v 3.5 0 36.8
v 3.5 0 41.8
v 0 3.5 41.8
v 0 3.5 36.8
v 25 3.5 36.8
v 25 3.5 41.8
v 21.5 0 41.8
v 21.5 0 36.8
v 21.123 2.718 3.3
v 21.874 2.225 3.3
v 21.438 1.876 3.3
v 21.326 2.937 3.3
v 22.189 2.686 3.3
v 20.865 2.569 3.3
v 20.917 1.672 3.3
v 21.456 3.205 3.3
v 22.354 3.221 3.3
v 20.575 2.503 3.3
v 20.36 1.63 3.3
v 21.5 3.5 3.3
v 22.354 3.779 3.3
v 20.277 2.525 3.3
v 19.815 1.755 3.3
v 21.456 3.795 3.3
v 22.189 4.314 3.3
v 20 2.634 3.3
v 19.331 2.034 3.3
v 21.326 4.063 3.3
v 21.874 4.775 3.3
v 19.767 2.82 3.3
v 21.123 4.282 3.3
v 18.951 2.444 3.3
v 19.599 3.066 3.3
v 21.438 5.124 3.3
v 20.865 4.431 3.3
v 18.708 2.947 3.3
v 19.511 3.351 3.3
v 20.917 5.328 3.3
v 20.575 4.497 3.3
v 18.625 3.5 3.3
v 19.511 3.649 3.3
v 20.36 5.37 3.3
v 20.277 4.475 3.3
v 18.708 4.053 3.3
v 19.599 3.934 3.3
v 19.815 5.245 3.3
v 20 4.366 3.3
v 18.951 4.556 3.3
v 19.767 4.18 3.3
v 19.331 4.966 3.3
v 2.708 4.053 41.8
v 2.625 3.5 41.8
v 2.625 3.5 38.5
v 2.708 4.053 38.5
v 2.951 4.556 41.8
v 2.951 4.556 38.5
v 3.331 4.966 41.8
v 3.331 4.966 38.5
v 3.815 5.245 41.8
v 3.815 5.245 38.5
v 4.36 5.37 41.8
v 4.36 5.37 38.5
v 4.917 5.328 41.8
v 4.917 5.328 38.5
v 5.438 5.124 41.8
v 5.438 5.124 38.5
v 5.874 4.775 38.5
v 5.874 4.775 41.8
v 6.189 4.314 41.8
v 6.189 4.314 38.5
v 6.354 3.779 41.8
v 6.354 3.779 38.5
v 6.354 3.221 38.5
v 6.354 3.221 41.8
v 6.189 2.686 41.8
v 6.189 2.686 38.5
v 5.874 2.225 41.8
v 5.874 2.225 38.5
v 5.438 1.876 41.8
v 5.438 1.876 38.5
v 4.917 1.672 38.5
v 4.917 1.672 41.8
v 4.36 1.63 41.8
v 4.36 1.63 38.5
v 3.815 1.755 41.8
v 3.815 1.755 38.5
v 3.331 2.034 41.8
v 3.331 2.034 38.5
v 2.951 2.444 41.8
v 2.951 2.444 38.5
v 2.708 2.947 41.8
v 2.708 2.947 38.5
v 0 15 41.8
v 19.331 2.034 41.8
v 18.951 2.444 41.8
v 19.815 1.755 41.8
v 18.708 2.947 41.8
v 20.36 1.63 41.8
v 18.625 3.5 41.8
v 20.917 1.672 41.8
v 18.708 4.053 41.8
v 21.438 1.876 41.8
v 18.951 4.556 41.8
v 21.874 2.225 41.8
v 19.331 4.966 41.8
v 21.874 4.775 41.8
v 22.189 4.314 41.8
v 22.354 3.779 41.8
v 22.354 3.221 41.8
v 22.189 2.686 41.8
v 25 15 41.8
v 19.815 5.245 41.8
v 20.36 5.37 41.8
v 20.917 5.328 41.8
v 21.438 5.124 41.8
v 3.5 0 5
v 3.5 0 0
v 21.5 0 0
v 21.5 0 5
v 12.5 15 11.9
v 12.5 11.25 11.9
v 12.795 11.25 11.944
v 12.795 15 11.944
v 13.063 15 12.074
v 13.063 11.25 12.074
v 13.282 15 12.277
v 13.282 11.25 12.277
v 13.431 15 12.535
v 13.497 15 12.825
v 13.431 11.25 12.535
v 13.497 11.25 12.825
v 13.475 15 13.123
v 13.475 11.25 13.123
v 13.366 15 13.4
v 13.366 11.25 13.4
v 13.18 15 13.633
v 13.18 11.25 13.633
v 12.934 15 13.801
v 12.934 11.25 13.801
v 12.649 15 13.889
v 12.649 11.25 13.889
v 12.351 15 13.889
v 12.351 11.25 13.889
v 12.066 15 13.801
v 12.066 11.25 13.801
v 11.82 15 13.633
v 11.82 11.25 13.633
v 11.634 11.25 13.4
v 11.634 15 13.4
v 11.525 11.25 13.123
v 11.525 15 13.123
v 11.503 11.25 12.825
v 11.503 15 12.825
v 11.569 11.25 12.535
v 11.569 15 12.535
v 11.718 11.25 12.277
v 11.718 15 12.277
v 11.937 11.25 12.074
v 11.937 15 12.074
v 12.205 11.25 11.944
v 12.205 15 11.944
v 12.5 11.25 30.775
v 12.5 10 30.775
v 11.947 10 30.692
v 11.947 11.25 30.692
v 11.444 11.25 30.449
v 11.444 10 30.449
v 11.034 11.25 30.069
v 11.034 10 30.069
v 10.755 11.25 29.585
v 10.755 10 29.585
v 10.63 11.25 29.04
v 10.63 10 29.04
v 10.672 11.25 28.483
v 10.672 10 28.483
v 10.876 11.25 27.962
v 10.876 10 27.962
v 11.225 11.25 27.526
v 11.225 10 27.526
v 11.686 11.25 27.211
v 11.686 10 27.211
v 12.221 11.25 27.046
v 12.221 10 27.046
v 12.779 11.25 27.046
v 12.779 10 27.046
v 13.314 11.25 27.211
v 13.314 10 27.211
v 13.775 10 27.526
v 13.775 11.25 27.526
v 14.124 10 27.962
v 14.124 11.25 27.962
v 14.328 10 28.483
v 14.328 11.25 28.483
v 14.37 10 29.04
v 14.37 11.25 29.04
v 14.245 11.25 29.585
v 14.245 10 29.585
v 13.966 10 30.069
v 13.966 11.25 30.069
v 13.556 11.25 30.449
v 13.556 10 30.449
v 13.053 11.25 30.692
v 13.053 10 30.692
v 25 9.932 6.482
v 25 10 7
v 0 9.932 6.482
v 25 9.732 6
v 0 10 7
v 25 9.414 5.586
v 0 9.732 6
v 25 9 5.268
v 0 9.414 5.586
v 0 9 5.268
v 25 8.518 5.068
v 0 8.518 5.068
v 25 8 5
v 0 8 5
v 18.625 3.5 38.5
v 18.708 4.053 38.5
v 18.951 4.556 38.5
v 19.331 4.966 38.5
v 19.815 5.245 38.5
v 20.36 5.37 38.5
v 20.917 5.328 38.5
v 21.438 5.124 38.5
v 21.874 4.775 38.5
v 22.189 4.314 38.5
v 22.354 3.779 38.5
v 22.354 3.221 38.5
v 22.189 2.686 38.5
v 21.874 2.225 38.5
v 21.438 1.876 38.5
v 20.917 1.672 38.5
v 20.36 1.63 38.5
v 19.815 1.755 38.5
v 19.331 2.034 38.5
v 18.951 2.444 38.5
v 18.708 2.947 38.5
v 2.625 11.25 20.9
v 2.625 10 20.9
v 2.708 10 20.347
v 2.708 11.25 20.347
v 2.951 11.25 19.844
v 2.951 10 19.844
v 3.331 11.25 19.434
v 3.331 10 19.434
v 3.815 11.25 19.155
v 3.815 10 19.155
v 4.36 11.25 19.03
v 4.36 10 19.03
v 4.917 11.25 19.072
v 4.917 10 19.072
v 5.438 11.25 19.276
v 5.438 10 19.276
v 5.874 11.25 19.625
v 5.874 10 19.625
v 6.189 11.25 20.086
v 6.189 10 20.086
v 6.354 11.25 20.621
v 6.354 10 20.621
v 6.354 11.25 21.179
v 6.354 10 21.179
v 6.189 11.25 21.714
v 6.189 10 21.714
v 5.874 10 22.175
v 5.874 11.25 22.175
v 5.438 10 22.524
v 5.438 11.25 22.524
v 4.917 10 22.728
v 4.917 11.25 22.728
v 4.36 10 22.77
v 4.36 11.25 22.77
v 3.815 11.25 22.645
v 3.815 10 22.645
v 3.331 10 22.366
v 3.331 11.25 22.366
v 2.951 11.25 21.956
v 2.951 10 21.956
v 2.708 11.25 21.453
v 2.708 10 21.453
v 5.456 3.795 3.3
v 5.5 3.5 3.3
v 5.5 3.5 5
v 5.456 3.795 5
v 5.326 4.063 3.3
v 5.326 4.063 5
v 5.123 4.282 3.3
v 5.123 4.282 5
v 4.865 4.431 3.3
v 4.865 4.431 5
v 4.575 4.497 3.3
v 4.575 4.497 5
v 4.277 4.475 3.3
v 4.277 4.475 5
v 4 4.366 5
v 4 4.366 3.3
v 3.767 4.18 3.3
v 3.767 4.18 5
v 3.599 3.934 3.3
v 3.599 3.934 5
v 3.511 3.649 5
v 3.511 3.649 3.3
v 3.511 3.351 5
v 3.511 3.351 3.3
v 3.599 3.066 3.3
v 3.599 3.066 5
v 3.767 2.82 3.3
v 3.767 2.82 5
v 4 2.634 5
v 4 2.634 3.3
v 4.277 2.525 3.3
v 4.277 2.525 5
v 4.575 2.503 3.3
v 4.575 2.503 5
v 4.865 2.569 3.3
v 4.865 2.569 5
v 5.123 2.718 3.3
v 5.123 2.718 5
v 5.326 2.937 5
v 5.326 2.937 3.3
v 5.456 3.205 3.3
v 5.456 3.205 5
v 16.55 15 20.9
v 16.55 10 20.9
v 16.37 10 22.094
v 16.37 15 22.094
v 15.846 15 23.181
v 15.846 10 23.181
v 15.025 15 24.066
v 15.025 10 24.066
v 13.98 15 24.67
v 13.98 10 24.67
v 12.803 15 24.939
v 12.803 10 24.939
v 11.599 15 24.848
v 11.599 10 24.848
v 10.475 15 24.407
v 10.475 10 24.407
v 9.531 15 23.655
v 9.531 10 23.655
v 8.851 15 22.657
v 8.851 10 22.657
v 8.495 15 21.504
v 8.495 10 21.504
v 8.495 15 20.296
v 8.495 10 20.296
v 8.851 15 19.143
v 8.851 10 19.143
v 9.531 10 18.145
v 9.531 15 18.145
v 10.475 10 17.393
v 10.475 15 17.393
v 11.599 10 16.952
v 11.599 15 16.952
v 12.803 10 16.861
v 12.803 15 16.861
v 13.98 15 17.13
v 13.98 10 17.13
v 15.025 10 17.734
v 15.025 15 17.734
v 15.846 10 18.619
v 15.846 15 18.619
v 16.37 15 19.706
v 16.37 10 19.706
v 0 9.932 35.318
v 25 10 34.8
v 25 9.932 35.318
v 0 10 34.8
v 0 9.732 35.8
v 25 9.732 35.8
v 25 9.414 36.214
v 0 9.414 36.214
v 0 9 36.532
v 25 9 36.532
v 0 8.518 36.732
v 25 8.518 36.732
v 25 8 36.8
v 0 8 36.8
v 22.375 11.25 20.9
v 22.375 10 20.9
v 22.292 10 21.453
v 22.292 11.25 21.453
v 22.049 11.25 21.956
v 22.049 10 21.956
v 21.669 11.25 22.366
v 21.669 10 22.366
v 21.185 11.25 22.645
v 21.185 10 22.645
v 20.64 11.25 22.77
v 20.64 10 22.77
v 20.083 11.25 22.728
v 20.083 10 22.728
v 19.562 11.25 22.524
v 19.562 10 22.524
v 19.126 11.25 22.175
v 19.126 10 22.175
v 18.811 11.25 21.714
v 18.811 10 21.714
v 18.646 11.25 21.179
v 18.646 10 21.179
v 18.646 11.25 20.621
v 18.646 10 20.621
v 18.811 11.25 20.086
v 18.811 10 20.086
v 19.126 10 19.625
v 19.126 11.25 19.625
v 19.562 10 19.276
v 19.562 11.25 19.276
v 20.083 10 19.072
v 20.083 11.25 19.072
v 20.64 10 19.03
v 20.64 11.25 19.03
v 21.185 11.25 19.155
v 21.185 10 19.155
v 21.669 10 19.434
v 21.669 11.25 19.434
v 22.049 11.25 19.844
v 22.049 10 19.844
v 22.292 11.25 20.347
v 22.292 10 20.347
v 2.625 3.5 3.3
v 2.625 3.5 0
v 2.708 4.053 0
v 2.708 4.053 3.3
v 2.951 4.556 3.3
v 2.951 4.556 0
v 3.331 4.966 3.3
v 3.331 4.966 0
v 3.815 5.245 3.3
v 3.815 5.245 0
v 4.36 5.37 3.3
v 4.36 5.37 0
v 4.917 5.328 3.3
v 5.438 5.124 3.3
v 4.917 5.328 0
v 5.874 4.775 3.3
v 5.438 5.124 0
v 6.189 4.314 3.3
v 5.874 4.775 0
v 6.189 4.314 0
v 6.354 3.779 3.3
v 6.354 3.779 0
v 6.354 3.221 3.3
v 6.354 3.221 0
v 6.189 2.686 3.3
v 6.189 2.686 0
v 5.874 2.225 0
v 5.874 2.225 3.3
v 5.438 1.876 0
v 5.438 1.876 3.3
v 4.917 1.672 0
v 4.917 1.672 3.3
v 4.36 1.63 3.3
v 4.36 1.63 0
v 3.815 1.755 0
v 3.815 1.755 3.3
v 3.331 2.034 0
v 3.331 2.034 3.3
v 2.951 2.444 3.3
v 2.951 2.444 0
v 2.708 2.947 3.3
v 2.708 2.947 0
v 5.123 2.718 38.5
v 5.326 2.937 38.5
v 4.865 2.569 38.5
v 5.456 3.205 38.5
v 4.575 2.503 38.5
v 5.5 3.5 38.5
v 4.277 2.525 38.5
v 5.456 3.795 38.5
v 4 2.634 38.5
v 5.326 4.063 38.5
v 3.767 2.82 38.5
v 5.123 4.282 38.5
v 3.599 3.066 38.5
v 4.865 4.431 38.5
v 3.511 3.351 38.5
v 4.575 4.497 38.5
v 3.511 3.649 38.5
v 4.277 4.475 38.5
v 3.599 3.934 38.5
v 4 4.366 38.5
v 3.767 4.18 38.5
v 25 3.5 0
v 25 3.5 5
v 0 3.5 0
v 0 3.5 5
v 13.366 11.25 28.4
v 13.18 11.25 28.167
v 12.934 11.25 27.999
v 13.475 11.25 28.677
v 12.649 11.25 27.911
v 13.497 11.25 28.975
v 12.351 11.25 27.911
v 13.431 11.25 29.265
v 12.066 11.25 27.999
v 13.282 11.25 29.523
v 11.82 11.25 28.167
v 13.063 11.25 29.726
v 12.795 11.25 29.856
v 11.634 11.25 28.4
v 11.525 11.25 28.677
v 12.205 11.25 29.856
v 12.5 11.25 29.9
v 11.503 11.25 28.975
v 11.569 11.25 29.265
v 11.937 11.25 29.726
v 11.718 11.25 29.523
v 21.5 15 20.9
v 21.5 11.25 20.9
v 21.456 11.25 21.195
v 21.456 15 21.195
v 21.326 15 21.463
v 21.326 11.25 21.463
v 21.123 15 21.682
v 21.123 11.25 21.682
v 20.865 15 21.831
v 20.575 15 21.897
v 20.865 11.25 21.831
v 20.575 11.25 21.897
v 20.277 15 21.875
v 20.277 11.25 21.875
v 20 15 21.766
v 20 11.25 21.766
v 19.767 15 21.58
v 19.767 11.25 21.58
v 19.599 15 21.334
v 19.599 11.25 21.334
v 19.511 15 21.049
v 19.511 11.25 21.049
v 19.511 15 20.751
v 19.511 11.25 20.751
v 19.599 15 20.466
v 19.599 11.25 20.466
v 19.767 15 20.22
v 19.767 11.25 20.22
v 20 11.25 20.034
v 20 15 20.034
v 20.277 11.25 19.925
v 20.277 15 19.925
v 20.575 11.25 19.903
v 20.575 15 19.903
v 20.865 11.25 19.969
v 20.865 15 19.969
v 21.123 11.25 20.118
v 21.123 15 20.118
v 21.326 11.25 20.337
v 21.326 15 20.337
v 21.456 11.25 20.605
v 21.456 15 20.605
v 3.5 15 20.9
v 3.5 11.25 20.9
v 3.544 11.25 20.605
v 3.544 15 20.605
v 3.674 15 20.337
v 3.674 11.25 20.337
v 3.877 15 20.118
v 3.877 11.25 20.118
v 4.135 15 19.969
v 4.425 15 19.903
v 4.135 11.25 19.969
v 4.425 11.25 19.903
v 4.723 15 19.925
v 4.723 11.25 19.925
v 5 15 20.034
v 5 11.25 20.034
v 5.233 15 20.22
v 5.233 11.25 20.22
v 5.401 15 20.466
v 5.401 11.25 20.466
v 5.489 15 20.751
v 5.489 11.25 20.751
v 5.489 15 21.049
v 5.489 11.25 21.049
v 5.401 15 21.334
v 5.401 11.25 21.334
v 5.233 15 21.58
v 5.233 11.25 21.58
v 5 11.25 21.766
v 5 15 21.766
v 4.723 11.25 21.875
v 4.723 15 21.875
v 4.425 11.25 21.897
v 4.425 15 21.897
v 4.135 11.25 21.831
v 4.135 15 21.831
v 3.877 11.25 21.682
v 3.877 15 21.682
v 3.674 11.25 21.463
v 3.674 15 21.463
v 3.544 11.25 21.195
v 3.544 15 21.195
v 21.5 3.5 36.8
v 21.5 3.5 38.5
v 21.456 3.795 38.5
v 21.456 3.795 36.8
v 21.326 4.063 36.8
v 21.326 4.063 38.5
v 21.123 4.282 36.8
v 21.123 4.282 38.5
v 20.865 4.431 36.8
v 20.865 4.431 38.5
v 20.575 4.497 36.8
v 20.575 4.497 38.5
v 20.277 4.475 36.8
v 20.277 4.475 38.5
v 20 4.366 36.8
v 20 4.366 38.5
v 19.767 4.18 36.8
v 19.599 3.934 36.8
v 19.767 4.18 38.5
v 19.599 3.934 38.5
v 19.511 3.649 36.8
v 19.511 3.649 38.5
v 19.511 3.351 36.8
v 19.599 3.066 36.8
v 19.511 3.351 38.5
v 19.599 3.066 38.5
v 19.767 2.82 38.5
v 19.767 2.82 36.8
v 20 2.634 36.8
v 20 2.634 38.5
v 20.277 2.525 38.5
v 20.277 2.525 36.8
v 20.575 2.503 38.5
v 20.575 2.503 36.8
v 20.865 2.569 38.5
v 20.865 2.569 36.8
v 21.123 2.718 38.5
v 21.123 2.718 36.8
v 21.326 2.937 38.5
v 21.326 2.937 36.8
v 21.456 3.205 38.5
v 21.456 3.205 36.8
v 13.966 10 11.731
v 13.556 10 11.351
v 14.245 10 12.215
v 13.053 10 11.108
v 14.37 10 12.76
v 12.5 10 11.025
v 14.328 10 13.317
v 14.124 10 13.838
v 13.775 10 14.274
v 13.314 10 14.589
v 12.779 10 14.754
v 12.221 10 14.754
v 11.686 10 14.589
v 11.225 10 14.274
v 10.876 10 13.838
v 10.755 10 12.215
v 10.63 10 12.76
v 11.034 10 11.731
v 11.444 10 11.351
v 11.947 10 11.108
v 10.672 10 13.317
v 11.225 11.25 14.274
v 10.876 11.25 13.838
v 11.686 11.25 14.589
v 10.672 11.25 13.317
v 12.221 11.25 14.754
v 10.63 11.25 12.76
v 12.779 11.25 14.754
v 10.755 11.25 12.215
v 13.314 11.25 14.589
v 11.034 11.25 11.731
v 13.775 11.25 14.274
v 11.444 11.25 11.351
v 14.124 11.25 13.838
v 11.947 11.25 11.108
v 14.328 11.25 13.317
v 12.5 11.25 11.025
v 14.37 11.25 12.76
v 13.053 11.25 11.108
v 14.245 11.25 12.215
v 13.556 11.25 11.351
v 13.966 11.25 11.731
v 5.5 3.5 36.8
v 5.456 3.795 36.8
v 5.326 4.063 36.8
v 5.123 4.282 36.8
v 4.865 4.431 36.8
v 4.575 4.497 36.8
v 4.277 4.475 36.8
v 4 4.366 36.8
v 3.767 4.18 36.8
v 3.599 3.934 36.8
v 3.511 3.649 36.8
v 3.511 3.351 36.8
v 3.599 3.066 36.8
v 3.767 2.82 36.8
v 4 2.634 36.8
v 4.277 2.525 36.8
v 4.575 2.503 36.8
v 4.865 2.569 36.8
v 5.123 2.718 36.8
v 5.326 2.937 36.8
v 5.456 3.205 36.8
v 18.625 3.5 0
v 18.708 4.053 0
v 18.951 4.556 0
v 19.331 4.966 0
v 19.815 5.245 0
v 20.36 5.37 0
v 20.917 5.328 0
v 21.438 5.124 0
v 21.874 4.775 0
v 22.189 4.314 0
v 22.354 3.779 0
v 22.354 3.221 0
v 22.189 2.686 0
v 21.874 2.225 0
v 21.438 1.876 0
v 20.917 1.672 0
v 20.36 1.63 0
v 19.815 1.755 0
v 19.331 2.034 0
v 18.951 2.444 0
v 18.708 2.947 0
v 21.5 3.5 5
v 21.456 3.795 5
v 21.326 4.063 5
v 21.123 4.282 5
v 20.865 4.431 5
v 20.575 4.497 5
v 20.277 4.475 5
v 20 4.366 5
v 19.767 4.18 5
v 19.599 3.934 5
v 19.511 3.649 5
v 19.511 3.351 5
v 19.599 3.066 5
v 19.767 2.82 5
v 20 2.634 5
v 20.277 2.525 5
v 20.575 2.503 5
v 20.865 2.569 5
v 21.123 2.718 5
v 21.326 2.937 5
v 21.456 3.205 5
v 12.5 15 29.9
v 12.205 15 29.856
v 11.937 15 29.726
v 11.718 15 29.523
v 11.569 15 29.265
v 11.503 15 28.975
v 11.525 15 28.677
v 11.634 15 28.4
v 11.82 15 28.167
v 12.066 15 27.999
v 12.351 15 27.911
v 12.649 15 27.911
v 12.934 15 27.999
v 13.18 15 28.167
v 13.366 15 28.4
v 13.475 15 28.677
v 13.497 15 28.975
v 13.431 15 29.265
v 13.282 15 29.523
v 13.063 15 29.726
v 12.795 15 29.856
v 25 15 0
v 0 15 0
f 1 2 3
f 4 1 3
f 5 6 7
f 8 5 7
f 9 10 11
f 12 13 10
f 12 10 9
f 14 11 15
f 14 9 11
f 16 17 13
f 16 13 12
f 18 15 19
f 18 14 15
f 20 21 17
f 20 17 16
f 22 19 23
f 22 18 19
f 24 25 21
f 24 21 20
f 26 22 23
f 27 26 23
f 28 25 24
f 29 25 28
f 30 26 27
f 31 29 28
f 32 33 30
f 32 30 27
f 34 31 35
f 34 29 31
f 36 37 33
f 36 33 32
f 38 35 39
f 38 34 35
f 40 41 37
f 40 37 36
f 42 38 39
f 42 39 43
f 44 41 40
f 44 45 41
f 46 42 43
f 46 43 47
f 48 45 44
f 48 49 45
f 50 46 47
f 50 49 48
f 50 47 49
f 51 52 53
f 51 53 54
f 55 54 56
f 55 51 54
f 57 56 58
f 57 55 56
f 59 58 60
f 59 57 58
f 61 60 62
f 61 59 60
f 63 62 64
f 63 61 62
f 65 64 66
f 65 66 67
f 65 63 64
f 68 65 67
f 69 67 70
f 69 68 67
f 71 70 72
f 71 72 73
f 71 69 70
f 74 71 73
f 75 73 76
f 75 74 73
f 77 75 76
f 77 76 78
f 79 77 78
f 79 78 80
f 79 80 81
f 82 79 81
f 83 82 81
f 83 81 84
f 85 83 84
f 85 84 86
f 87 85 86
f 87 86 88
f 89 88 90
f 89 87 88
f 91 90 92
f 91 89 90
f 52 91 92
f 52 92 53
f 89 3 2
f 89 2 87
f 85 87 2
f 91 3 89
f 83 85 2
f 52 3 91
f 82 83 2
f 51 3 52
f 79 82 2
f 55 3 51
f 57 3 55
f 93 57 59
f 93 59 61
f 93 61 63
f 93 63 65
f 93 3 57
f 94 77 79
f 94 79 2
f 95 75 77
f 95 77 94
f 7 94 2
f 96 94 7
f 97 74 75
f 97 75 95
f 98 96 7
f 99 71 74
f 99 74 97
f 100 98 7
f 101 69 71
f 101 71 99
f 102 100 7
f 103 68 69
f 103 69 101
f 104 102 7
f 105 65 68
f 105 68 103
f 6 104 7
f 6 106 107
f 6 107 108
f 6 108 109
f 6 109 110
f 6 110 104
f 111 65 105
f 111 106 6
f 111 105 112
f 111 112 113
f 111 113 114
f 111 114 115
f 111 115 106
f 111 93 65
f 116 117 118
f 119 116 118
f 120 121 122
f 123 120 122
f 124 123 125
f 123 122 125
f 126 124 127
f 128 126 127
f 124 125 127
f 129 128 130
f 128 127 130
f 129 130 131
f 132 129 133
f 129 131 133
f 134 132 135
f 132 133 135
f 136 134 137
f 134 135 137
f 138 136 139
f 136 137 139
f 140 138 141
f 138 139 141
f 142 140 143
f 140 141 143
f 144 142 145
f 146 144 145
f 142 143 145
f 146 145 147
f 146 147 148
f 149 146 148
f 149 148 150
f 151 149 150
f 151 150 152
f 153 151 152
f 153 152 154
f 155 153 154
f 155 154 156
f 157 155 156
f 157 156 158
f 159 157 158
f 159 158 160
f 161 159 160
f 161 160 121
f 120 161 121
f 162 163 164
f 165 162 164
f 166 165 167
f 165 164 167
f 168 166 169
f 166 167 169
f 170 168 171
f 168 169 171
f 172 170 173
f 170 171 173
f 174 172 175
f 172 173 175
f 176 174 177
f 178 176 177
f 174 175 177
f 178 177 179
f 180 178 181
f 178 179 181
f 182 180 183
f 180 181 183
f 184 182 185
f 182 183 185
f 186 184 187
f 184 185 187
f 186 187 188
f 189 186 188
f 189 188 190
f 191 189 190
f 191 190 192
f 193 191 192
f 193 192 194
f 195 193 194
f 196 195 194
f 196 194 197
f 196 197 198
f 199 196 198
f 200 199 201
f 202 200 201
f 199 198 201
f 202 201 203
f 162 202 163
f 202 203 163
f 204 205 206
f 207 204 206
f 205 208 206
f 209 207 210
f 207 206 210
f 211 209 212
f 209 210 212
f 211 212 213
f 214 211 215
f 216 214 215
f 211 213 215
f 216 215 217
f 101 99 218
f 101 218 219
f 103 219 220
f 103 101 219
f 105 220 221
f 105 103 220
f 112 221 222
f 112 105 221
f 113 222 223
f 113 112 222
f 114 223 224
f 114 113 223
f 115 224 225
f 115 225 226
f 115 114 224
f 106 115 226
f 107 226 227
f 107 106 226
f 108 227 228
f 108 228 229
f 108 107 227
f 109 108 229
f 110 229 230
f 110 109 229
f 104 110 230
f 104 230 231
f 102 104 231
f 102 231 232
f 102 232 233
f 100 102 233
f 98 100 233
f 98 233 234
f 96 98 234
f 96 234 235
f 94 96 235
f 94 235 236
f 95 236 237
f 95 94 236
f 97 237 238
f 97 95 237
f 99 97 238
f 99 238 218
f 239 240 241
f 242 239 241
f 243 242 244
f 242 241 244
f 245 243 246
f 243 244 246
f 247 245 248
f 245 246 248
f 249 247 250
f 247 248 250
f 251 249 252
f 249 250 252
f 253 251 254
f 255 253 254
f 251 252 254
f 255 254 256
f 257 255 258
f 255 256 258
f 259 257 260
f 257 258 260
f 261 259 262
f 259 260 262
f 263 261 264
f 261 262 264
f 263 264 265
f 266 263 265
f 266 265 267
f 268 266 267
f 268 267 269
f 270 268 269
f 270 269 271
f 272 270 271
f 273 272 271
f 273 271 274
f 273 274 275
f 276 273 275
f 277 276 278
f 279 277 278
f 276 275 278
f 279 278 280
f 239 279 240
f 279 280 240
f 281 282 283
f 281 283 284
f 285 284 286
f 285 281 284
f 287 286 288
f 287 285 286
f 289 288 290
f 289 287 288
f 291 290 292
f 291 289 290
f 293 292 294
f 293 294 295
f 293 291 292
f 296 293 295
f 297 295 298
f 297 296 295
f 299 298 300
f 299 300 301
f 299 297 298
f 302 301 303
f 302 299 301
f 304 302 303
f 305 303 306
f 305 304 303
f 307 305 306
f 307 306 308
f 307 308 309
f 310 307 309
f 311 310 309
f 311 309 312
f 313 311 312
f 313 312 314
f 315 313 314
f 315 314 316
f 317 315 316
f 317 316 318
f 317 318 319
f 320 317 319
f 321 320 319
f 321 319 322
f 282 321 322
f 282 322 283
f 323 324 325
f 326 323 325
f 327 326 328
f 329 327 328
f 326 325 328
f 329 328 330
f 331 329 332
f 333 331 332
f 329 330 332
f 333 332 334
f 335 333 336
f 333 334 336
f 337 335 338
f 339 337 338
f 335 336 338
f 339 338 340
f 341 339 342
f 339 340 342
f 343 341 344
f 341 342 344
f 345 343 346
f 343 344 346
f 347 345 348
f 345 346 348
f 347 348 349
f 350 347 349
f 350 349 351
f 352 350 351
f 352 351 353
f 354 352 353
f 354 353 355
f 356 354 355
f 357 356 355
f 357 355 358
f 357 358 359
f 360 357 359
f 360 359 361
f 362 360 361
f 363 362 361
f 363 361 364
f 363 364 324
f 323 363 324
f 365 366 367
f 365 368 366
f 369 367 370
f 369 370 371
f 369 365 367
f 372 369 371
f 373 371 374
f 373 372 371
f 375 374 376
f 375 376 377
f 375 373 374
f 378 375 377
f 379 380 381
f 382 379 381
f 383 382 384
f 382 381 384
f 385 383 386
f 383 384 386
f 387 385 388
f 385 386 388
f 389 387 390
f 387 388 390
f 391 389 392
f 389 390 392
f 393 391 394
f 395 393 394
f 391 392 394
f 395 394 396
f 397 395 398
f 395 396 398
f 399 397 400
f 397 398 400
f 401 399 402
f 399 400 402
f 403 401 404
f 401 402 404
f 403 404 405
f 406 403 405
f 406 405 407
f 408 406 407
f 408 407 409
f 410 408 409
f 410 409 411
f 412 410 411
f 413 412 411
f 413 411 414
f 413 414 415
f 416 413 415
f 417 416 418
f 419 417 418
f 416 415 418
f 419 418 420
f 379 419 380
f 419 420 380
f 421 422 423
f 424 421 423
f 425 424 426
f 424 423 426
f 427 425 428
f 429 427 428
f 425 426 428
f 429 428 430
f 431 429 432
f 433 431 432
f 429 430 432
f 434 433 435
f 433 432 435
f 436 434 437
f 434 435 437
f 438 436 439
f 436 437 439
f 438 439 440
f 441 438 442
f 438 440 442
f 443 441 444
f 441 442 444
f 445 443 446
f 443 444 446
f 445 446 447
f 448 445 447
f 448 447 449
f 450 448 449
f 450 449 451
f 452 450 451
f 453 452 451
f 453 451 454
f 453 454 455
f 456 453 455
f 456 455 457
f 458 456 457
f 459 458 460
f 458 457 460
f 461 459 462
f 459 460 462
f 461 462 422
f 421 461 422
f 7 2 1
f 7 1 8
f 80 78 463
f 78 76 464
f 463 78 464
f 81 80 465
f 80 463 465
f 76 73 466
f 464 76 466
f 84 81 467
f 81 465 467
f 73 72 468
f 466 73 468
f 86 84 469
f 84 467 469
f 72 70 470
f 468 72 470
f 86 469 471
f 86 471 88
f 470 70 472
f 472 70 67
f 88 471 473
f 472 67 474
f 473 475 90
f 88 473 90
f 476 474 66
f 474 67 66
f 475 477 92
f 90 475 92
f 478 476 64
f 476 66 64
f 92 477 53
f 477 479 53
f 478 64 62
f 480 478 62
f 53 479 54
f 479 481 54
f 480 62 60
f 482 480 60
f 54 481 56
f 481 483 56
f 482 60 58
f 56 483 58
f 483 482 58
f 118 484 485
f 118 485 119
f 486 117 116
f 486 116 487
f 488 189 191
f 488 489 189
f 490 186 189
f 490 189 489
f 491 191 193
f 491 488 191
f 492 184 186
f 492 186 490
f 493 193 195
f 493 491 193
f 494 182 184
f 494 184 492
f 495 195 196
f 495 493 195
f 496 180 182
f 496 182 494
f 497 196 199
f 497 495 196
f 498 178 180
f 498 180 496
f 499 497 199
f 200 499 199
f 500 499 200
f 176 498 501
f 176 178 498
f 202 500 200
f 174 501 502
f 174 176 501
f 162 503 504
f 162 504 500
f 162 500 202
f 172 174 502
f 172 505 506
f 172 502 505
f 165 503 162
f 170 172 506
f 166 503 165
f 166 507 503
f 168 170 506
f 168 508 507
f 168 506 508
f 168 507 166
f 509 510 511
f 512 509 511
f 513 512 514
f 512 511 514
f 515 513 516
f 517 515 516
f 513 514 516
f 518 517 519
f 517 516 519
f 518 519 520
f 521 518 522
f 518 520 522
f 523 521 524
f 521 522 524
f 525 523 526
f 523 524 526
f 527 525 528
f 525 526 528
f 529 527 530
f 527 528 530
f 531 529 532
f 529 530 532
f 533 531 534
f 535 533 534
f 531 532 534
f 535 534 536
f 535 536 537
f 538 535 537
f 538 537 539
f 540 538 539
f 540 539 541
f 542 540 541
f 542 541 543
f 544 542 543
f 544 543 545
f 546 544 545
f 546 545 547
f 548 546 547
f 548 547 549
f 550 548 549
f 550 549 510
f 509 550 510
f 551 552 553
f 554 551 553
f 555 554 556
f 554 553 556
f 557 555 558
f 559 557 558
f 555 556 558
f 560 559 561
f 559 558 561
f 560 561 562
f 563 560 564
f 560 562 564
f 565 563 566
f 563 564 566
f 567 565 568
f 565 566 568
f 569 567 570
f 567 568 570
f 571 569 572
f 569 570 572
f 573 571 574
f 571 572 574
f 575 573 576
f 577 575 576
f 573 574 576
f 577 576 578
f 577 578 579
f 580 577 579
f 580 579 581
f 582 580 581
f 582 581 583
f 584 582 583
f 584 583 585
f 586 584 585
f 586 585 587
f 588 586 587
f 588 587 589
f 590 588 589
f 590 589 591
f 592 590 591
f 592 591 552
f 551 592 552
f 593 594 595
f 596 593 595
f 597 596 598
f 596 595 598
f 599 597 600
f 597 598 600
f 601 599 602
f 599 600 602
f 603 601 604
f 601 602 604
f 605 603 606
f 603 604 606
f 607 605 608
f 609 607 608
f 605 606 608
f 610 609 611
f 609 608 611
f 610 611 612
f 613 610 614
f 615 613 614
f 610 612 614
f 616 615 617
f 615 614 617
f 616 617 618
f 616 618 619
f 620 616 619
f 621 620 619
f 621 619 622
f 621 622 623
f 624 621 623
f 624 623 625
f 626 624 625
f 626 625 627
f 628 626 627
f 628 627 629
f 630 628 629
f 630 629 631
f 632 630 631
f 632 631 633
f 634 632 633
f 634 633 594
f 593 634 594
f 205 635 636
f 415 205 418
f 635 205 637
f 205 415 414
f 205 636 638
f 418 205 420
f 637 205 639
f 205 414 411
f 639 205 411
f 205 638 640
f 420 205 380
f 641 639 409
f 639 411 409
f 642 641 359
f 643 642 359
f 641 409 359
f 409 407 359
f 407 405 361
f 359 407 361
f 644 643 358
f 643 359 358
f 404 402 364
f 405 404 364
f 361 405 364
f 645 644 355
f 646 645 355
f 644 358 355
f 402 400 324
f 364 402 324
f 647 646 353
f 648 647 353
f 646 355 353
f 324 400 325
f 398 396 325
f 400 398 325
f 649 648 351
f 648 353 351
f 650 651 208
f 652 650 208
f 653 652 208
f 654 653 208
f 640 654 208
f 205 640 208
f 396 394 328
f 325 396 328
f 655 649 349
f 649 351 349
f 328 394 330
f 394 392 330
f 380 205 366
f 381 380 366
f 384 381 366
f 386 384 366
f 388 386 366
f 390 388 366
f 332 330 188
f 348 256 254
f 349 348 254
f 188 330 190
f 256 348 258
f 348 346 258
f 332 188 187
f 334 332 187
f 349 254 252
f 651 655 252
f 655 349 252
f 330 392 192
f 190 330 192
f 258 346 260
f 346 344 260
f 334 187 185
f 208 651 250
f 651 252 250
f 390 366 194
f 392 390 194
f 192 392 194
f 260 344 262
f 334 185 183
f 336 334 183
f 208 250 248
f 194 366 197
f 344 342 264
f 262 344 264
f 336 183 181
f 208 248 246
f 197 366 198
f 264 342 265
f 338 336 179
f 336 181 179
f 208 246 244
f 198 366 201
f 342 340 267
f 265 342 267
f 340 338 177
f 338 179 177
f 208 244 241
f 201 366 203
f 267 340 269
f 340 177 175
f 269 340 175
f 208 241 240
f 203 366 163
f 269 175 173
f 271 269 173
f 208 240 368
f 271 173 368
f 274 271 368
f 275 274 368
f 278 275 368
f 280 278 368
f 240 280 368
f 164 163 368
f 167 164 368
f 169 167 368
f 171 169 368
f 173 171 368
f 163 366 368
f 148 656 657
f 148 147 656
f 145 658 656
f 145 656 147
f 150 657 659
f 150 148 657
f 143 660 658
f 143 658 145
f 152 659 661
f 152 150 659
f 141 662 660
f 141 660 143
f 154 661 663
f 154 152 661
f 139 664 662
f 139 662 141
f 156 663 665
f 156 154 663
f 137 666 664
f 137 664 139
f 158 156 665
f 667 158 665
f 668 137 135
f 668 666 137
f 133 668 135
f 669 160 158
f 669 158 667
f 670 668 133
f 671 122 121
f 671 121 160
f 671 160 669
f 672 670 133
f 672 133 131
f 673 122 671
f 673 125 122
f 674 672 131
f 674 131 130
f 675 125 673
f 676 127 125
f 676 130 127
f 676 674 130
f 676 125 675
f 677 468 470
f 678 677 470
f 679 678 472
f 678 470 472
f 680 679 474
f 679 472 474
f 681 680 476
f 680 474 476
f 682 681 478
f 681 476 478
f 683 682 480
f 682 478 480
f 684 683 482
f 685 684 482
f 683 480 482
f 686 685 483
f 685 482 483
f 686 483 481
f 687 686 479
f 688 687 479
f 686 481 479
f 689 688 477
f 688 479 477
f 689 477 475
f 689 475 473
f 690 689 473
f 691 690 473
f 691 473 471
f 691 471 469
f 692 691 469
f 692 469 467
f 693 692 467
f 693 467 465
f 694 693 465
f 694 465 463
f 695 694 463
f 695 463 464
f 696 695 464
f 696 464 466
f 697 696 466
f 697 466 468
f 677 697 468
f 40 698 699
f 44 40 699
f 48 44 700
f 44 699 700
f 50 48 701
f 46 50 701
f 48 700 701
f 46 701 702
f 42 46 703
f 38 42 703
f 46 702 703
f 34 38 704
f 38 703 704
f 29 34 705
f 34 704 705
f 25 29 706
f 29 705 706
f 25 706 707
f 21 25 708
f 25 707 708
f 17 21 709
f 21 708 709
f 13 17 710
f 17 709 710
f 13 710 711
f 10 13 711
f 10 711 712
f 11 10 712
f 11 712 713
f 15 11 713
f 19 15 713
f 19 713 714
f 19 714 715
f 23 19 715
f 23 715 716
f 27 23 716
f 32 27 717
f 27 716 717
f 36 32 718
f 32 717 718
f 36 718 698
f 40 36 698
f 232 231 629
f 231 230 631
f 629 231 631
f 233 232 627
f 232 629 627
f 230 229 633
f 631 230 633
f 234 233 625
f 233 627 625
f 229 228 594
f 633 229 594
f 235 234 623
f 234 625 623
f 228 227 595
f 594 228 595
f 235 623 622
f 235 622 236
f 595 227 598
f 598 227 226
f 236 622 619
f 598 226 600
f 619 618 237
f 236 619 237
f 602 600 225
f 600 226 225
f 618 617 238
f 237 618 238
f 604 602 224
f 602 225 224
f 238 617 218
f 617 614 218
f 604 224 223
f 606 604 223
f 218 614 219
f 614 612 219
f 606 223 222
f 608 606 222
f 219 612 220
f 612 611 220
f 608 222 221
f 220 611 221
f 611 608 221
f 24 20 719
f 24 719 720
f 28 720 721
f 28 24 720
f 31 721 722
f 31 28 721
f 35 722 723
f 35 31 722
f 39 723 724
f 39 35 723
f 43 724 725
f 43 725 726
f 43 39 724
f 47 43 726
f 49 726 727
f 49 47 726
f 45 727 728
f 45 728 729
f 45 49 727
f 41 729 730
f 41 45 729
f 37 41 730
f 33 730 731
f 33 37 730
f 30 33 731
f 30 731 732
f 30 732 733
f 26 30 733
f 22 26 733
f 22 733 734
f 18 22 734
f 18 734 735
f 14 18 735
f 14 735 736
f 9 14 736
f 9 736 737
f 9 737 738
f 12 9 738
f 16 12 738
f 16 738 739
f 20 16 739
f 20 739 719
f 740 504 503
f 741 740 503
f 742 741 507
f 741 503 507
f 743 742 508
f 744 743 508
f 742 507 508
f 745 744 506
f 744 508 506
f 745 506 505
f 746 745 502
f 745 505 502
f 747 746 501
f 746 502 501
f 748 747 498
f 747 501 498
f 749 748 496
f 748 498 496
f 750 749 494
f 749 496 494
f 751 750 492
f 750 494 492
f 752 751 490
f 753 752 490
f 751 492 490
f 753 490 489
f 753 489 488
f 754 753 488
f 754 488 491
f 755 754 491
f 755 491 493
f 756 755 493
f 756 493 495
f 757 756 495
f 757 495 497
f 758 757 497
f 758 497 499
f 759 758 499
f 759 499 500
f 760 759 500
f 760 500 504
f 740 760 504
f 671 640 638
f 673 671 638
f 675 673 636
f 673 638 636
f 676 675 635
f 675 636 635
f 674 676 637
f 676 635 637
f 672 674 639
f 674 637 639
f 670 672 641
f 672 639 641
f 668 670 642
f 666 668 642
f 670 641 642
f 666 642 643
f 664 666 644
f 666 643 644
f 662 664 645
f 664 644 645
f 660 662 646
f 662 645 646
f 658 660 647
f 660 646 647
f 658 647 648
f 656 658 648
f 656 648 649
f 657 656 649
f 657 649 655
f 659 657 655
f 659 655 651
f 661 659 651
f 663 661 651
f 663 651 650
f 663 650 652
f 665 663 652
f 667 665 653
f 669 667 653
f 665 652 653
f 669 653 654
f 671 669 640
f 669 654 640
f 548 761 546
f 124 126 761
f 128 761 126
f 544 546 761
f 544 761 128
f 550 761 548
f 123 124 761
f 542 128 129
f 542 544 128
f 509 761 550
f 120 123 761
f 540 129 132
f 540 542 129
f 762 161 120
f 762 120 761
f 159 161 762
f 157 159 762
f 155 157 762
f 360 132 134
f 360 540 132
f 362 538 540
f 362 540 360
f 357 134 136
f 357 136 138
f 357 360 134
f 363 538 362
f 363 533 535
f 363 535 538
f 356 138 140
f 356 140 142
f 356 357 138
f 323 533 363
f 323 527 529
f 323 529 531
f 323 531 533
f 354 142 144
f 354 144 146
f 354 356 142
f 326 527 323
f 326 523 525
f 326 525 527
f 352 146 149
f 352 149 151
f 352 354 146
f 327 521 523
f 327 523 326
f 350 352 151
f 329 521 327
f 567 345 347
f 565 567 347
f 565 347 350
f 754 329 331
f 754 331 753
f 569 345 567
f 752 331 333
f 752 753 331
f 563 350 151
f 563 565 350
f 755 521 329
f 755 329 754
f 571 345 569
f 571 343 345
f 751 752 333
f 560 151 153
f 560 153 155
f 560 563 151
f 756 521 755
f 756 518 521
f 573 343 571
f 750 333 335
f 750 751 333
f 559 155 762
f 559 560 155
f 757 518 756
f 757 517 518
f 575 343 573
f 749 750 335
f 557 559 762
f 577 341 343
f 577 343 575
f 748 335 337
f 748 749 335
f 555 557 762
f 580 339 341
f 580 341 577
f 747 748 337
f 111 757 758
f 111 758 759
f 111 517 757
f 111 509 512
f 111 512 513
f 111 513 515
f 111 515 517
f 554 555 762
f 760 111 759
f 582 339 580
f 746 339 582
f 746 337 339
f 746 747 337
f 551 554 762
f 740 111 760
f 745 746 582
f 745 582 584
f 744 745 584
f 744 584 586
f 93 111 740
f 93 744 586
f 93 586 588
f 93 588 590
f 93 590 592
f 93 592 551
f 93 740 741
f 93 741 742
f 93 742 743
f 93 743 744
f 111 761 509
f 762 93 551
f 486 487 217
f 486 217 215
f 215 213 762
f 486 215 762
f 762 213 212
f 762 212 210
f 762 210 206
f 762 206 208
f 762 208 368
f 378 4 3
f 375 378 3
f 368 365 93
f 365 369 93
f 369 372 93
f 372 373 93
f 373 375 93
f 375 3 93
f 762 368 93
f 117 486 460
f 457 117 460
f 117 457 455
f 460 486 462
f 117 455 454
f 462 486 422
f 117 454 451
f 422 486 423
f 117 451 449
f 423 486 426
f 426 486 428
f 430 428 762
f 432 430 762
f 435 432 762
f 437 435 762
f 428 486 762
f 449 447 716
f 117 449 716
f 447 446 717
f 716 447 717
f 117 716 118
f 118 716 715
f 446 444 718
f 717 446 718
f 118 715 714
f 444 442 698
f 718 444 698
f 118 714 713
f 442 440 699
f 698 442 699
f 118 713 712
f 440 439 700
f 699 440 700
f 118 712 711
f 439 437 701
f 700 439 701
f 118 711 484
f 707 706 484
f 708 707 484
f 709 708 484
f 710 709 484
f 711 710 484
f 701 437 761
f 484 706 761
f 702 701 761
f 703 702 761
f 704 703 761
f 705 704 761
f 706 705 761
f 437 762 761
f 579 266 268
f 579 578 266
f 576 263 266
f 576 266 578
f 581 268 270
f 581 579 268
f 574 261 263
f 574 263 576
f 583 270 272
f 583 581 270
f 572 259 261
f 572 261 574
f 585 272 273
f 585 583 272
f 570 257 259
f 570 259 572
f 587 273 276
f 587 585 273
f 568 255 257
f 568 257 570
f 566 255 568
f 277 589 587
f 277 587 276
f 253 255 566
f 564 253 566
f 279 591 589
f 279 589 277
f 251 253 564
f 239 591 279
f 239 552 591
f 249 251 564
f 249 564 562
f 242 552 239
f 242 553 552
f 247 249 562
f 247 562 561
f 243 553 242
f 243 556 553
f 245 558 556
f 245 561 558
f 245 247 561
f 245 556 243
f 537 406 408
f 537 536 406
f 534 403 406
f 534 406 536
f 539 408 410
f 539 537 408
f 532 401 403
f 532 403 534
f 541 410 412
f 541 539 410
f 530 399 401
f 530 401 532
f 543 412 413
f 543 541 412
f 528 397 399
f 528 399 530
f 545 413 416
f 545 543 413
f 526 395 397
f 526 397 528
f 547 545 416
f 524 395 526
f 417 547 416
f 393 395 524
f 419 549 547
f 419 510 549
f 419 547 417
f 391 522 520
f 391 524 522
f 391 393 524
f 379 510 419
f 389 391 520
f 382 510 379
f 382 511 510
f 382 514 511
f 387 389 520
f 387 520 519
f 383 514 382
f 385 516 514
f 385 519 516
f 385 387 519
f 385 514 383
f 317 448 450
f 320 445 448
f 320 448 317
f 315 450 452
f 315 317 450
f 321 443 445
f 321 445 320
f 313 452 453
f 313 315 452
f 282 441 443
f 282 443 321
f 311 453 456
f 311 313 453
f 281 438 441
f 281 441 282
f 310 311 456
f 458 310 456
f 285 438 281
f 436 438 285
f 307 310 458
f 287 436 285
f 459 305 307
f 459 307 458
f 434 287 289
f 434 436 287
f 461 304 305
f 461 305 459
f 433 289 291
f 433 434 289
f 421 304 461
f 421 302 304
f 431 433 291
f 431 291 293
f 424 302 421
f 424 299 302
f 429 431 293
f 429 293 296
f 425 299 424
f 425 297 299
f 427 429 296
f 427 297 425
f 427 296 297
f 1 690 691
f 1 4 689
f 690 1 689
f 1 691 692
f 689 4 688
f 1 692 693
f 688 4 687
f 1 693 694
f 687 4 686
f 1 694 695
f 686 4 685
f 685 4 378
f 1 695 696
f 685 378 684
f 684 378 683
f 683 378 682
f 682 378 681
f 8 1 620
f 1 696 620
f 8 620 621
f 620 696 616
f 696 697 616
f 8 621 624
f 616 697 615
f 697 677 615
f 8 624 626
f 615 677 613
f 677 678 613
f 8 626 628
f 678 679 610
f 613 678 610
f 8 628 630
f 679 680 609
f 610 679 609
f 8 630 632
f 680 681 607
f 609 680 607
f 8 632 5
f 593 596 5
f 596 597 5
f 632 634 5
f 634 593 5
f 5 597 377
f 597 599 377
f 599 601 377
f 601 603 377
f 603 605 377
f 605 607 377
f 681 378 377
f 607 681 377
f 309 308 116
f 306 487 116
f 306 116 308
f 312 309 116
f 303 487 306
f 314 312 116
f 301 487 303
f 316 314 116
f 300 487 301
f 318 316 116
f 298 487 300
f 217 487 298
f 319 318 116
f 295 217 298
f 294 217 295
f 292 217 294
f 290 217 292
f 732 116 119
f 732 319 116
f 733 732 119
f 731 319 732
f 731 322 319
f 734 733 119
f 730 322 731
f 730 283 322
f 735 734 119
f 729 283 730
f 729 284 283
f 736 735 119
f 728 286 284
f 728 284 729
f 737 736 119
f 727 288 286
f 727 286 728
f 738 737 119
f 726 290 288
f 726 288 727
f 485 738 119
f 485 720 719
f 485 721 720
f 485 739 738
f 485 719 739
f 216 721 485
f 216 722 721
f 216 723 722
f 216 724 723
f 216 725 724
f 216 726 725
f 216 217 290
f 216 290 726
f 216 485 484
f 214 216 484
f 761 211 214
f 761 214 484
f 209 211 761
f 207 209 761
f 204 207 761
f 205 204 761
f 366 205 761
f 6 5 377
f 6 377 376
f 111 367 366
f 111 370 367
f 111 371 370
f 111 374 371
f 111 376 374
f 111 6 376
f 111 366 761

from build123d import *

# Parameters (mm, degrees)
SKETCH1_W           = 25
SKETCH1_H           = 15
SKETCH1_R           = 1
BOSS_EXTRUDE1_DEPTH = 5
SKETCH2_R           = 1.875
CUT_EXTRUDE1_DEPTH  = 3.3
CUT_EXTRUDE2_DEPTH  = 30.580398915
BOSS_EXTRUDE2_REACH = 48.949
SKETCH4_W           = 25
SKETCH4_H           = 5
SKETCH5_R           = 1
CUT_EXTRUDE3_DEPTH  = 50.721625074
SKETCH8_R           = 1.875
CUT_EXTRUDE4_DEPTH  = 1.25
CIRPATTERN1_COUNT   = 4
SKETCH9_R           = 4.05
CUT_EXTRUDE5_DEPTH  = 50.721625074
FILLET1_R           = 2
FILLET2_R           = 2


with BuildPart() as part:
    # Sketch1 → Boss-Extrude1 (new body)
    with BuildSketch(Plane.XY):
        with Locations((12.5, 7.5)):
            Rectangle(SKETCH1_W, SKETCH1_H)
        with Locations((4.5, 3.5)):
            Circle(SKETCH1_R, mode=Mode.SUBTRACT)
        with Locations((20.5, 3.5)):
            Circle(SKETCH1_R, mode=Mode.SUBTRACT)
    extrude(amount=BOSS_EXTRUDE1_DEPTH)

    # Sketch2 → Cut-Extrude1 (cut)
    with BuildSketch(Plane(origin=(0, 0, 0), x_dir=(-1, 0, 0), z_dir=(0, 0, -1))):
        with Locations((-20.5, 3.5)):
            Circle(SKETCH2_R)
        with Locations((-4.5, 3.5)):
            Circle(SKETCH2_R)
    extrude(amount=-CUT_EXTRUDE1_DEPTH, mode=Mode.SUBTRACT)

    # Sketch3 → Cut-Extrude2 (cut, through all)
    with BuildSketch(Plane(origin=(0, 0, 0), x_dir=(-1, 0, 0), z_dir=(0, 0, -1))):
        Polygon((0, 0), (-3.5, 0), (0, 3.5), align=None)
        Polygon((-21.5, 0), (-25, 0), (-25, 3.5), align=None)
    extrude(amount=-CUT_EXTRUDE2_DEPTH, mode=Mode.SUBTRACT)


with BuildPart() as body_2:
    # Mirror5: mirrored copy
    add(part.part.mirror(Plane.XY.offset(20.9)))


with BuildPart() as part_1:
    add(part.part)

    # Sketch4 → Boss-Extrude2 (add, up to next)
    with BuildSketch(Plane(origin=(0, 0, 36.8), x_dir=(-1, 0, 0), z_dir=(0, 0, -1)), mode=Mode.PRIVATE) as boss_extrude2_sk1:
        with Locations((-12.5, 12.5)):
            Rectangle(SKETCH4_W, SKETCH4_H)
    boss_extrude2_tool1 = extrude(boss_extrude2_sk1.sketch, amount=BOSS_EXTRUDE2_REACH, mode=Mode.PRIVATE) - part_1.part

    add(body_2.part)  # Boss-Extrude2 merges body 2
    add(boss_extrude2_tool1.solids().sort_by_distance((12.5, 12.5, 36.8))[0])

    # Sketch5 → Cut-Extrude3 (cut, through all)
    with BuildSketch(Plane.XZ.offset(-10)):
        with Locations((20.5, 20.9)):
            Circle(SKETCH5_R)
    cut_extrude3 = extrude(amount=-CUT_EXTRUDE3_DEPTH, mode=Mode.SUBTRACT)

    # Sketch8 → Cut-Extrude4 (cut)
    with BuildSketch(Plane.XZ.offset(-10)):
        with Locations((20.5, 20.9)):
            Circle(SKETCH8_R)
    cut_extrude4 = extrude(amount=-CUT_EXTRUDE4_DEPTH, mode=Mode.SUBTRACT)

    # CirPattern1: Cut-Extrude3, Cut-Extrude4 ×4 about axis
    cirpattern1_axis = Axis((12.5, -0.75, 20.9), (0, 1, 0))
    add([cut_extrude3.rotate(cirpattern1_axis, i * 360 / CIRPATTERN1_COUNT) for i in range(1, CIRPATTERN1_COUNT)], mode=Mode.SUBTRACT)
    add([cut_extrude4.rotate(cirpattern1_axis, i * 360 / CIRPATTERN1_COUNT) for i in range(1, CIRPATTERN1_COUNT)], mode=Mode.SUBTRACT)

    # Sketch9 → Cut-Extrude5 (cut, through all)
    with BuildSketch(Plane.XZ.offset(-10)):
        with Locations((12.5, 20.9)):
            Circle(SKETCH9_R)
    extrude(amount=-CUT_EXTRUDE5_DEPTH, mode=Mode.SUBTRACT)

    # Fillet1
    fillet1_edges = [part_1.edges().sort_by_distance(p)[0] for p in [
        (12.5, 10, 36.8),
    ]]
    fillet(fillet1_edges, radius=FILLET1_R)

    # Fillet2
    fillet2_edges = [part_1.edges().sort_by_distance(p)[0] for p in [
        (12.5, 10, 5),
    ]]
    fillet(fillet2_edges, radius=FILLET2_R)


solid = part_1.part
